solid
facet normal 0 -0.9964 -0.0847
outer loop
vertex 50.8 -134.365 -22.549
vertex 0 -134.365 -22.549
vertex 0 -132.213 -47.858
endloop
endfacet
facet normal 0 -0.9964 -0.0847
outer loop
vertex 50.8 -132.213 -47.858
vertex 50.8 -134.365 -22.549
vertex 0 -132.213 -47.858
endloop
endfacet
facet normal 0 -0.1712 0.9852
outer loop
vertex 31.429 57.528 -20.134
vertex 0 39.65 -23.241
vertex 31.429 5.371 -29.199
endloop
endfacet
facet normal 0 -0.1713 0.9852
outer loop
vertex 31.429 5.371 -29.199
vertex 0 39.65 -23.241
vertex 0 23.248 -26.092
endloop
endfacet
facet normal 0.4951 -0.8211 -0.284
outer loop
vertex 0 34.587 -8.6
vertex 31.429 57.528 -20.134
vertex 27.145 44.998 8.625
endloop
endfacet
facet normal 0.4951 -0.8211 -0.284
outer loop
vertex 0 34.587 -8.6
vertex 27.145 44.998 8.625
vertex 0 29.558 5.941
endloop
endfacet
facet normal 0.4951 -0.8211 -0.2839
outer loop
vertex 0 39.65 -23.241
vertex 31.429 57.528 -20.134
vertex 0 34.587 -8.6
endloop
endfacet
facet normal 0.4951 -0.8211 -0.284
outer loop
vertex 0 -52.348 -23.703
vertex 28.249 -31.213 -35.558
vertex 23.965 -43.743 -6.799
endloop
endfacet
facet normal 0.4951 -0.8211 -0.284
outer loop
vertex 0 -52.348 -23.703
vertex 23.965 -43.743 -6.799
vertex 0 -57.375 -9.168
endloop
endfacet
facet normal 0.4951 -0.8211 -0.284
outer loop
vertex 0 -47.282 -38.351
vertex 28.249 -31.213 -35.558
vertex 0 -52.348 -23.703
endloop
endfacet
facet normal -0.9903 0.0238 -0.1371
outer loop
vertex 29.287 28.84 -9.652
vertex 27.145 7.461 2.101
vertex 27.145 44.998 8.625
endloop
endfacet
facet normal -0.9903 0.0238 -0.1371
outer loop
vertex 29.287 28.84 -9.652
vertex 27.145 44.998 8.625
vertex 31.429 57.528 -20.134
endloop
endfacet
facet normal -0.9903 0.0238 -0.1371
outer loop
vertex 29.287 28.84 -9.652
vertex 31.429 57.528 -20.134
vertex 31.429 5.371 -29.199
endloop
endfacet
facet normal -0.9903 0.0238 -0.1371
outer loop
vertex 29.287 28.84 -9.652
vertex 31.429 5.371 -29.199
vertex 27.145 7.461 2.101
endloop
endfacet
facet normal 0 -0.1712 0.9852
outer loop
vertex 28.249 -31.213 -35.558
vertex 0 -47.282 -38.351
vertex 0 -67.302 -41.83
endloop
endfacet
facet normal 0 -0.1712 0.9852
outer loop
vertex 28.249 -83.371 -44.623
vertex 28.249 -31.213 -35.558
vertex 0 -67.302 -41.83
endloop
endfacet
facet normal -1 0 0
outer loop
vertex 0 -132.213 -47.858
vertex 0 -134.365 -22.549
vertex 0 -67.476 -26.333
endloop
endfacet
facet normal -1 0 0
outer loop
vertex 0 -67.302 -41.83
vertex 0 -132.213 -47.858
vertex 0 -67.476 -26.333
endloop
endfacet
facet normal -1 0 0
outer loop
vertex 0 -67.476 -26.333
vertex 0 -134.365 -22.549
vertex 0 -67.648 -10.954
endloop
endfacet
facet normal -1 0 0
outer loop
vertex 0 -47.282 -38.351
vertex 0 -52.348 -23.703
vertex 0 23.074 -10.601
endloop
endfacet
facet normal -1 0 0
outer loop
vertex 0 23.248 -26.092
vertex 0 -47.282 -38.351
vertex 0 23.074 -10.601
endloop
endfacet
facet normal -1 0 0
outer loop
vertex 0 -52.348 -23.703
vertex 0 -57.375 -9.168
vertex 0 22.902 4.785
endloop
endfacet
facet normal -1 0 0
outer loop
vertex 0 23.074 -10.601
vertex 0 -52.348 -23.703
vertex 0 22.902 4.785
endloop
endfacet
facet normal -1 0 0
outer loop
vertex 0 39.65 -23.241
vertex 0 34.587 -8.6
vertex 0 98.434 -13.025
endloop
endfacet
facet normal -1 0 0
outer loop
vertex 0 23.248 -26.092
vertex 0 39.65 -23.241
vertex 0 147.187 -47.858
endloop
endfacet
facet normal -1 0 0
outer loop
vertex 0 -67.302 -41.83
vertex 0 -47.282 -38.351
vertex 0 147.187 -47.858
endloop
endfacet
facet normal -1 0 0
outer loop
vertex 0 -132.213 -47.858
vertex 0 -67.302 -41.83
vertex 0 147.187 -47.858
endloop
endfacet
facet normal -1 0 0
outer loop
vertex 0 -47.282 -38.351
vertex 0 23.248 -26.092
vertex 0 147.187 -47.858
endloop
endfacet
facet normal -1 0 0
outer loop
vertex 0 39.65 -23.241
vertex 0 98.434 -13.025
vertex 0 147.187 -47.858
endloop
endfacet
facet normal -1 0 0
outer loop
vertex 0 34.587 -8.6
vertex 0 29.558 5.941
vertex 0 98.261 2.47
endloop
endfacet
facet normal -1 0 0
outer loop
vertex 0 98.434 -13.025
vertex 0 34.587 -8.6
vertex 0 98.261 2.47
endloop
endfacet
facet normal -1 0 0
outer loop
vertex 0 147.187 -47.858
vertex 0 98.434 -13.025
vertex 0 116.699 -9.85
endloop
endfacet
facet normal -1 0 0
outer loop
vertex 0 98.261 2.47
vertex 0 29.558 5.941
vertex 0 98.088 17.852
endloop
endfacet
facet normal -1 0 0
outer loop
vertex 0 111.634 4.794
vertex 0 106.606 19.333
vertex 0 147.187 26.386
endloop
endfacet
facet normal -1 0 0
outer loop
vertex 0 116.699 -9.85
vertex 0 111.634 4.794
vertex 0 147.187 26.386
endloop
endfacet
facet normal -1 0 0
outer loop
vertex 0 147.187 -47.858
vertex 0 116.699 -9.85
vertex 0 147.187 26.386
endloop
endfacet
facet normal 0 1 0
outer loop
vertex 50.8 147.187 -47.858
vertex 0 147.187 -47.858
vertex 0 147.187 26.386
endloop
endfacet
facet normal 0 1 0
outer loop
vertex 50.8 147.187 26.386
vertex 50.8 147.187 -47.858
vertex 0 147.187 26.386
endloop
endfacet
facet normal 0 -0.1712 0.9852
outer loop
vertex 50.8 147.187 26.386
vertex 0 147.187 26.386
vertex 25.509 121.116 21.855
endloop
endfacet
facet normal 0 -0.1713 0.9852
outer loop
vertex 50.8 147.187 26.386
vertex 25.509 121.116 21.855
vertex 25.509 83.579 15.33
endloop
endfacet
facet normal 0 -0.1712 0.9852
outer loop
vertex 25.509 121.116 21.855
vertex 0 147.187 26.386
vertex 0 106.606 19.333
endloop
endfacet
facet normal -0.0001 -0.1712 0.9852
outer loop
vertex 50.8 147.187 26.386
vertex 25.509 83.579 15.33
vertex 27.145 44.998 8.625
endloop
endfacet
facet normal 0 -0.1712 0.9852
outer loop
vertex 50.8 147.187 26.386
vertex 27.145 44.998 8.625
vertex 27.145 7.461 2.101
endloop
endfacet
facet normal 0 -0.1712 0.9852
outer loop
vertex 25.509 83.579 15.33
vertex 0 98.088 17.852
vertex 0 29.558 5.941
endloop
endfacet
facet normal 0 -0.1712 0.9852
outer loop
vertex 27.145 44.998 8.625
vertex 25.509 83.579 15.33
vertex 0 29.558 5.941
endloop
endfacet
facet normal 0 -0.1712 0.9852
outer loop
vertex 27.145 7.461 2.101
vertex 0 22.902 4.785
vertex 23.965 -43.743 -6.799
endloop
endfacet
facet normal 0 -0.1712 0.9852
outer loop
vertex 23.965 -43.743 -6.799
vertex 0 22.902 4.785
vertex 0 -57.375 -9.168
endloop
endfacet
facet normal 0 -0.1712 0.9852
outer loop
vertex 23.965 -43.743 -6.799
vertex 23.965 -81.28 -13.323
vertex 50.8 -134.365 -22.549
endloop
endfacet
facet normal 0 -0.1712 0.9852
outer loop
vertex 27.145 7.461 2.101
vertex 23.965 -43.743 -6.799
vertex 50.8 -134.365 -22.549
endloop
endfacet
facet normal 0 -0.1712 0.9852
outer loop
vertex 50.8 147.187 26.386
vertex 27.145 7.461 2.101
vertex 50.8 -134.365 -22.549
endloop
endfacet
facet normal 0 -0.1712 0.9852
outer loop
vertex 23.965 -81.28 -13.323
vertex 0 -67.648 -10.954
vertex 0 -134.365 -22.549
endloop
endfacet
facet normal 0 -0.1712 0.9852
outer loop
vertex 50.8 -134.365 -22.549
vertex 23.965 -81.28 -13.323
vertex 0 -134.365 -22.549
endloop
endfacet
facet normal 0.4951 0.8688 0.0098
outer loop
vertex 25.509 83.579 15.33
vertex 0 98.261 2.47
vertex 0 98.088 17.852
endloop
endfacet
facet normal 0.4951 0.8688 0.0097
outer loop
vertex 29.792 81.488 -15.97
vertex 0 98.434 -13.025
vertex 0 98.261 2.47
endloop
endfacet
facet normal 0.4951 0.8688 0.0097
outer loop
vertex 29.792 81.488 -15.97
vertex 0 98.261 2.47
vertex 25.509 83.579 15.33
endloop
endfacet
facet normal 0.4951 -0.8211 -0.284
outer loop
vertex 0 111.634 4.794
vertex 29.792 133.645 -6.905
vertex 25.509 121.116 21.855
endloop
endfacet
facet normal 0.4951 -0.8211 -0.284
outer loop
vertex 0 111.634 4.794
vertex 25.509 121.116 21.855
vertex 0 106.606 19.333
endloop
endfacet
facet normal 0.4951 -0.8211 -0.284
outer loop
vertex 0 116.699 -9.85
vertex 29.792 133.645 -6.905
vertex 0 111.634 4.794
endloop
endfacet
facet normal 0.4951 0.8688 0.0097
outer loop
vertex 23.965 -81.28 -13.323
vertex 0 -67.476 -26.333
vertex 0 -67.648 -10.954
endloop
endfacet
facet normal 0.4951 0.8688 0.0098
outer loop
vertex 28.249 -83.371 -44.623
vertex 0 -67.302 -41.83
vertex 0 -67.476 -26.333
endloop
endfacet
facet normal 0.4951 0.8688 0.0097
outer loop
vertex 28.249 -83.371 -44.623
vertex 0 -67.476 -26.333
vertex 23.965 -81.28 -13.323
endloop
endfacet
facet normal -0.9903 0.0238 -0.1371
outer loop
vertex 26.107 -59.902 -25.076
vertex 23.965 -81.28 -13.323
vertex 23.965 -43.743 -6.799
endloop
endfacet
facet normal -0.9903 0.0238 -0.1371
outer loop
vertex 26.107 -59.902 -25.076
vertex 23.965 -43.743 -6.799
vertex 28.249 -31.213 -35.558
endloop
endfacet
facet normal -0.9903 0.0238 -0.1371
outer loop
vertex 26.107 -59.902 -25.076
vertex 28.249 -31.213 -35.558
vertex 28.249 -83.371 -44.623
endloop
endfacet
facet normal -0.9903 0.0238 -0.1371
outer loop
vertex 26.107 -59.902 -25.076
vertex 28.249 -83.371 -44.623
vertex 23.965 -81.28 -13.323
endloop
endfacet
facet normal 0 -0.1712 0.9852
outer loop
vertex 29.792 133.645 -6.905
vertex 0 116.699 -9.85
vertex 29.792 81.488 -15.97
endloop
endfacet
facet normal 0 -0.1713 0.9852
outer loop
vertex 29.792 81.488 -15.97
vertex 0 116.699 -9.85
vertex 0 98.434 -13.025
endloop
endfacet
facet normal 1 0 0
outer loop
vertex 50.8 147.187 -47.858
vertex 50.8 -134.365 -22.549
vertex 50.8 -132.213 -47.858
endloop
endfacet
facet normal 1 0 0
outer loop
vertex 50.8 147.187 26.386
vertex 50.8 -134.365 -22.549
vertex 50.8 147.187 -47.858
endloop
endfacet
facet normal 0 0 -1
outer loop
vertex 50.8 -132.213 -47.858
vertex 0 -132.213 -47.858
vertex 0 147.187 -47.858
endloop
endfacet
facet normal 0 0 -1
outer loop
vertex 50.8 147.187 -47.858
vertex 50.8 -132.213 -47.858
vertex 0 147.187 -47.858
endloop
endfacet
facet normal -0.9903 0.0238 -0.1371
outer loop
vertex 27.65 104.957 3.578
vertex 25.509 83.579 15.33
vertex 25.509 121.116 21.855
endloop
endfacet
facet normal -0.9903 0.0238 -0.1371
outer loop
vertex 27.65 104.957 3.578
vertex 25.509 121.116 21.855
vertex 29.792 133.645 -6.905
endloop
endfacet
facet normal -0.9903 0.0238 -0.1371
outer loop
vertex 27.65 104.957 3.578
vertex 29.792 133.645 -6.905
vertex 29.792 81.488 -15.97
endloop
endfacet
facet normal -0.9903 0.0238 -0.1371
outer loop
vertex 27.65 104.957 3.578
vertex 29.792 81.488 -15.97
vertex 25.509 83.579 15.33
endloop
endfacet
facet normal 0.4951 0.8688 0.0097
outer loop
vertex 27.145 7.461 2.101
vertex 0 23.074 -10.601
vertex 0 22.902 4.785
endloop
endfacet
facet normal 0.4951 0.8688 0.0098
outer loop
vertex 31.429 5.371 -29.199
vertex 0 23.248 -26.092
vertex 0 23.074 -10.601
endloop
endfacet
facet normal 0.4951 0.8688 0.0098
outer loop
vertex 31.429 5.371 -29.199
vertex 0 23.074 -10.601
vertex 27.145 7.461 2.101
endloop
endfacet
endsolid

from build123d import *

# Parameters (mm, degrees)
F1_DEPTH = 50.8
F3_DEPTH = 30.48
F3_TAPER = -8


with BuildPart() as f1:
    # F0 (on Right) → F1 (new body)
    with BuildSketch(Plane.YZ):
        Polygon((-134.3647271911, -22.5492262361), (-132.2128937073, -47.857912742), (147.1871062927, -47.857912742), (147.1871062927, 26.385902432), align=None)
    extrude(amount=F1_DEPTH)

    # F2 (on face) → F3 (cut)
    with BuildSketch(Plane(origin=(0, -0.1356486827, 0.780464594), x_dir=(1, 0, 0), z_dir=(0, -0.1712378928, 0.9852297113))):
        Polygon((23.9652451582, -44.2607051253), (0, -58.0970458686), (0, -68.524364382), (23.9652451582, -82.3607051253), align=None)
        Polygon((25.5085083311, 123.0692242943), (0, 108.3418801427), (0, 99.6965684458), (25.5085083311, 84.9692242943), align=None)
        Polygon((27.1452323874, 45.8107569695), (0, 30.1384497434), (0, 23.3830641955), (27.1452323874, 7.7107569695), align=None)
    extrude(amount=-F3_DEPTH, taper=F3_TAPER, mode=Mode.SUBTRACT)


solid = f1.part
